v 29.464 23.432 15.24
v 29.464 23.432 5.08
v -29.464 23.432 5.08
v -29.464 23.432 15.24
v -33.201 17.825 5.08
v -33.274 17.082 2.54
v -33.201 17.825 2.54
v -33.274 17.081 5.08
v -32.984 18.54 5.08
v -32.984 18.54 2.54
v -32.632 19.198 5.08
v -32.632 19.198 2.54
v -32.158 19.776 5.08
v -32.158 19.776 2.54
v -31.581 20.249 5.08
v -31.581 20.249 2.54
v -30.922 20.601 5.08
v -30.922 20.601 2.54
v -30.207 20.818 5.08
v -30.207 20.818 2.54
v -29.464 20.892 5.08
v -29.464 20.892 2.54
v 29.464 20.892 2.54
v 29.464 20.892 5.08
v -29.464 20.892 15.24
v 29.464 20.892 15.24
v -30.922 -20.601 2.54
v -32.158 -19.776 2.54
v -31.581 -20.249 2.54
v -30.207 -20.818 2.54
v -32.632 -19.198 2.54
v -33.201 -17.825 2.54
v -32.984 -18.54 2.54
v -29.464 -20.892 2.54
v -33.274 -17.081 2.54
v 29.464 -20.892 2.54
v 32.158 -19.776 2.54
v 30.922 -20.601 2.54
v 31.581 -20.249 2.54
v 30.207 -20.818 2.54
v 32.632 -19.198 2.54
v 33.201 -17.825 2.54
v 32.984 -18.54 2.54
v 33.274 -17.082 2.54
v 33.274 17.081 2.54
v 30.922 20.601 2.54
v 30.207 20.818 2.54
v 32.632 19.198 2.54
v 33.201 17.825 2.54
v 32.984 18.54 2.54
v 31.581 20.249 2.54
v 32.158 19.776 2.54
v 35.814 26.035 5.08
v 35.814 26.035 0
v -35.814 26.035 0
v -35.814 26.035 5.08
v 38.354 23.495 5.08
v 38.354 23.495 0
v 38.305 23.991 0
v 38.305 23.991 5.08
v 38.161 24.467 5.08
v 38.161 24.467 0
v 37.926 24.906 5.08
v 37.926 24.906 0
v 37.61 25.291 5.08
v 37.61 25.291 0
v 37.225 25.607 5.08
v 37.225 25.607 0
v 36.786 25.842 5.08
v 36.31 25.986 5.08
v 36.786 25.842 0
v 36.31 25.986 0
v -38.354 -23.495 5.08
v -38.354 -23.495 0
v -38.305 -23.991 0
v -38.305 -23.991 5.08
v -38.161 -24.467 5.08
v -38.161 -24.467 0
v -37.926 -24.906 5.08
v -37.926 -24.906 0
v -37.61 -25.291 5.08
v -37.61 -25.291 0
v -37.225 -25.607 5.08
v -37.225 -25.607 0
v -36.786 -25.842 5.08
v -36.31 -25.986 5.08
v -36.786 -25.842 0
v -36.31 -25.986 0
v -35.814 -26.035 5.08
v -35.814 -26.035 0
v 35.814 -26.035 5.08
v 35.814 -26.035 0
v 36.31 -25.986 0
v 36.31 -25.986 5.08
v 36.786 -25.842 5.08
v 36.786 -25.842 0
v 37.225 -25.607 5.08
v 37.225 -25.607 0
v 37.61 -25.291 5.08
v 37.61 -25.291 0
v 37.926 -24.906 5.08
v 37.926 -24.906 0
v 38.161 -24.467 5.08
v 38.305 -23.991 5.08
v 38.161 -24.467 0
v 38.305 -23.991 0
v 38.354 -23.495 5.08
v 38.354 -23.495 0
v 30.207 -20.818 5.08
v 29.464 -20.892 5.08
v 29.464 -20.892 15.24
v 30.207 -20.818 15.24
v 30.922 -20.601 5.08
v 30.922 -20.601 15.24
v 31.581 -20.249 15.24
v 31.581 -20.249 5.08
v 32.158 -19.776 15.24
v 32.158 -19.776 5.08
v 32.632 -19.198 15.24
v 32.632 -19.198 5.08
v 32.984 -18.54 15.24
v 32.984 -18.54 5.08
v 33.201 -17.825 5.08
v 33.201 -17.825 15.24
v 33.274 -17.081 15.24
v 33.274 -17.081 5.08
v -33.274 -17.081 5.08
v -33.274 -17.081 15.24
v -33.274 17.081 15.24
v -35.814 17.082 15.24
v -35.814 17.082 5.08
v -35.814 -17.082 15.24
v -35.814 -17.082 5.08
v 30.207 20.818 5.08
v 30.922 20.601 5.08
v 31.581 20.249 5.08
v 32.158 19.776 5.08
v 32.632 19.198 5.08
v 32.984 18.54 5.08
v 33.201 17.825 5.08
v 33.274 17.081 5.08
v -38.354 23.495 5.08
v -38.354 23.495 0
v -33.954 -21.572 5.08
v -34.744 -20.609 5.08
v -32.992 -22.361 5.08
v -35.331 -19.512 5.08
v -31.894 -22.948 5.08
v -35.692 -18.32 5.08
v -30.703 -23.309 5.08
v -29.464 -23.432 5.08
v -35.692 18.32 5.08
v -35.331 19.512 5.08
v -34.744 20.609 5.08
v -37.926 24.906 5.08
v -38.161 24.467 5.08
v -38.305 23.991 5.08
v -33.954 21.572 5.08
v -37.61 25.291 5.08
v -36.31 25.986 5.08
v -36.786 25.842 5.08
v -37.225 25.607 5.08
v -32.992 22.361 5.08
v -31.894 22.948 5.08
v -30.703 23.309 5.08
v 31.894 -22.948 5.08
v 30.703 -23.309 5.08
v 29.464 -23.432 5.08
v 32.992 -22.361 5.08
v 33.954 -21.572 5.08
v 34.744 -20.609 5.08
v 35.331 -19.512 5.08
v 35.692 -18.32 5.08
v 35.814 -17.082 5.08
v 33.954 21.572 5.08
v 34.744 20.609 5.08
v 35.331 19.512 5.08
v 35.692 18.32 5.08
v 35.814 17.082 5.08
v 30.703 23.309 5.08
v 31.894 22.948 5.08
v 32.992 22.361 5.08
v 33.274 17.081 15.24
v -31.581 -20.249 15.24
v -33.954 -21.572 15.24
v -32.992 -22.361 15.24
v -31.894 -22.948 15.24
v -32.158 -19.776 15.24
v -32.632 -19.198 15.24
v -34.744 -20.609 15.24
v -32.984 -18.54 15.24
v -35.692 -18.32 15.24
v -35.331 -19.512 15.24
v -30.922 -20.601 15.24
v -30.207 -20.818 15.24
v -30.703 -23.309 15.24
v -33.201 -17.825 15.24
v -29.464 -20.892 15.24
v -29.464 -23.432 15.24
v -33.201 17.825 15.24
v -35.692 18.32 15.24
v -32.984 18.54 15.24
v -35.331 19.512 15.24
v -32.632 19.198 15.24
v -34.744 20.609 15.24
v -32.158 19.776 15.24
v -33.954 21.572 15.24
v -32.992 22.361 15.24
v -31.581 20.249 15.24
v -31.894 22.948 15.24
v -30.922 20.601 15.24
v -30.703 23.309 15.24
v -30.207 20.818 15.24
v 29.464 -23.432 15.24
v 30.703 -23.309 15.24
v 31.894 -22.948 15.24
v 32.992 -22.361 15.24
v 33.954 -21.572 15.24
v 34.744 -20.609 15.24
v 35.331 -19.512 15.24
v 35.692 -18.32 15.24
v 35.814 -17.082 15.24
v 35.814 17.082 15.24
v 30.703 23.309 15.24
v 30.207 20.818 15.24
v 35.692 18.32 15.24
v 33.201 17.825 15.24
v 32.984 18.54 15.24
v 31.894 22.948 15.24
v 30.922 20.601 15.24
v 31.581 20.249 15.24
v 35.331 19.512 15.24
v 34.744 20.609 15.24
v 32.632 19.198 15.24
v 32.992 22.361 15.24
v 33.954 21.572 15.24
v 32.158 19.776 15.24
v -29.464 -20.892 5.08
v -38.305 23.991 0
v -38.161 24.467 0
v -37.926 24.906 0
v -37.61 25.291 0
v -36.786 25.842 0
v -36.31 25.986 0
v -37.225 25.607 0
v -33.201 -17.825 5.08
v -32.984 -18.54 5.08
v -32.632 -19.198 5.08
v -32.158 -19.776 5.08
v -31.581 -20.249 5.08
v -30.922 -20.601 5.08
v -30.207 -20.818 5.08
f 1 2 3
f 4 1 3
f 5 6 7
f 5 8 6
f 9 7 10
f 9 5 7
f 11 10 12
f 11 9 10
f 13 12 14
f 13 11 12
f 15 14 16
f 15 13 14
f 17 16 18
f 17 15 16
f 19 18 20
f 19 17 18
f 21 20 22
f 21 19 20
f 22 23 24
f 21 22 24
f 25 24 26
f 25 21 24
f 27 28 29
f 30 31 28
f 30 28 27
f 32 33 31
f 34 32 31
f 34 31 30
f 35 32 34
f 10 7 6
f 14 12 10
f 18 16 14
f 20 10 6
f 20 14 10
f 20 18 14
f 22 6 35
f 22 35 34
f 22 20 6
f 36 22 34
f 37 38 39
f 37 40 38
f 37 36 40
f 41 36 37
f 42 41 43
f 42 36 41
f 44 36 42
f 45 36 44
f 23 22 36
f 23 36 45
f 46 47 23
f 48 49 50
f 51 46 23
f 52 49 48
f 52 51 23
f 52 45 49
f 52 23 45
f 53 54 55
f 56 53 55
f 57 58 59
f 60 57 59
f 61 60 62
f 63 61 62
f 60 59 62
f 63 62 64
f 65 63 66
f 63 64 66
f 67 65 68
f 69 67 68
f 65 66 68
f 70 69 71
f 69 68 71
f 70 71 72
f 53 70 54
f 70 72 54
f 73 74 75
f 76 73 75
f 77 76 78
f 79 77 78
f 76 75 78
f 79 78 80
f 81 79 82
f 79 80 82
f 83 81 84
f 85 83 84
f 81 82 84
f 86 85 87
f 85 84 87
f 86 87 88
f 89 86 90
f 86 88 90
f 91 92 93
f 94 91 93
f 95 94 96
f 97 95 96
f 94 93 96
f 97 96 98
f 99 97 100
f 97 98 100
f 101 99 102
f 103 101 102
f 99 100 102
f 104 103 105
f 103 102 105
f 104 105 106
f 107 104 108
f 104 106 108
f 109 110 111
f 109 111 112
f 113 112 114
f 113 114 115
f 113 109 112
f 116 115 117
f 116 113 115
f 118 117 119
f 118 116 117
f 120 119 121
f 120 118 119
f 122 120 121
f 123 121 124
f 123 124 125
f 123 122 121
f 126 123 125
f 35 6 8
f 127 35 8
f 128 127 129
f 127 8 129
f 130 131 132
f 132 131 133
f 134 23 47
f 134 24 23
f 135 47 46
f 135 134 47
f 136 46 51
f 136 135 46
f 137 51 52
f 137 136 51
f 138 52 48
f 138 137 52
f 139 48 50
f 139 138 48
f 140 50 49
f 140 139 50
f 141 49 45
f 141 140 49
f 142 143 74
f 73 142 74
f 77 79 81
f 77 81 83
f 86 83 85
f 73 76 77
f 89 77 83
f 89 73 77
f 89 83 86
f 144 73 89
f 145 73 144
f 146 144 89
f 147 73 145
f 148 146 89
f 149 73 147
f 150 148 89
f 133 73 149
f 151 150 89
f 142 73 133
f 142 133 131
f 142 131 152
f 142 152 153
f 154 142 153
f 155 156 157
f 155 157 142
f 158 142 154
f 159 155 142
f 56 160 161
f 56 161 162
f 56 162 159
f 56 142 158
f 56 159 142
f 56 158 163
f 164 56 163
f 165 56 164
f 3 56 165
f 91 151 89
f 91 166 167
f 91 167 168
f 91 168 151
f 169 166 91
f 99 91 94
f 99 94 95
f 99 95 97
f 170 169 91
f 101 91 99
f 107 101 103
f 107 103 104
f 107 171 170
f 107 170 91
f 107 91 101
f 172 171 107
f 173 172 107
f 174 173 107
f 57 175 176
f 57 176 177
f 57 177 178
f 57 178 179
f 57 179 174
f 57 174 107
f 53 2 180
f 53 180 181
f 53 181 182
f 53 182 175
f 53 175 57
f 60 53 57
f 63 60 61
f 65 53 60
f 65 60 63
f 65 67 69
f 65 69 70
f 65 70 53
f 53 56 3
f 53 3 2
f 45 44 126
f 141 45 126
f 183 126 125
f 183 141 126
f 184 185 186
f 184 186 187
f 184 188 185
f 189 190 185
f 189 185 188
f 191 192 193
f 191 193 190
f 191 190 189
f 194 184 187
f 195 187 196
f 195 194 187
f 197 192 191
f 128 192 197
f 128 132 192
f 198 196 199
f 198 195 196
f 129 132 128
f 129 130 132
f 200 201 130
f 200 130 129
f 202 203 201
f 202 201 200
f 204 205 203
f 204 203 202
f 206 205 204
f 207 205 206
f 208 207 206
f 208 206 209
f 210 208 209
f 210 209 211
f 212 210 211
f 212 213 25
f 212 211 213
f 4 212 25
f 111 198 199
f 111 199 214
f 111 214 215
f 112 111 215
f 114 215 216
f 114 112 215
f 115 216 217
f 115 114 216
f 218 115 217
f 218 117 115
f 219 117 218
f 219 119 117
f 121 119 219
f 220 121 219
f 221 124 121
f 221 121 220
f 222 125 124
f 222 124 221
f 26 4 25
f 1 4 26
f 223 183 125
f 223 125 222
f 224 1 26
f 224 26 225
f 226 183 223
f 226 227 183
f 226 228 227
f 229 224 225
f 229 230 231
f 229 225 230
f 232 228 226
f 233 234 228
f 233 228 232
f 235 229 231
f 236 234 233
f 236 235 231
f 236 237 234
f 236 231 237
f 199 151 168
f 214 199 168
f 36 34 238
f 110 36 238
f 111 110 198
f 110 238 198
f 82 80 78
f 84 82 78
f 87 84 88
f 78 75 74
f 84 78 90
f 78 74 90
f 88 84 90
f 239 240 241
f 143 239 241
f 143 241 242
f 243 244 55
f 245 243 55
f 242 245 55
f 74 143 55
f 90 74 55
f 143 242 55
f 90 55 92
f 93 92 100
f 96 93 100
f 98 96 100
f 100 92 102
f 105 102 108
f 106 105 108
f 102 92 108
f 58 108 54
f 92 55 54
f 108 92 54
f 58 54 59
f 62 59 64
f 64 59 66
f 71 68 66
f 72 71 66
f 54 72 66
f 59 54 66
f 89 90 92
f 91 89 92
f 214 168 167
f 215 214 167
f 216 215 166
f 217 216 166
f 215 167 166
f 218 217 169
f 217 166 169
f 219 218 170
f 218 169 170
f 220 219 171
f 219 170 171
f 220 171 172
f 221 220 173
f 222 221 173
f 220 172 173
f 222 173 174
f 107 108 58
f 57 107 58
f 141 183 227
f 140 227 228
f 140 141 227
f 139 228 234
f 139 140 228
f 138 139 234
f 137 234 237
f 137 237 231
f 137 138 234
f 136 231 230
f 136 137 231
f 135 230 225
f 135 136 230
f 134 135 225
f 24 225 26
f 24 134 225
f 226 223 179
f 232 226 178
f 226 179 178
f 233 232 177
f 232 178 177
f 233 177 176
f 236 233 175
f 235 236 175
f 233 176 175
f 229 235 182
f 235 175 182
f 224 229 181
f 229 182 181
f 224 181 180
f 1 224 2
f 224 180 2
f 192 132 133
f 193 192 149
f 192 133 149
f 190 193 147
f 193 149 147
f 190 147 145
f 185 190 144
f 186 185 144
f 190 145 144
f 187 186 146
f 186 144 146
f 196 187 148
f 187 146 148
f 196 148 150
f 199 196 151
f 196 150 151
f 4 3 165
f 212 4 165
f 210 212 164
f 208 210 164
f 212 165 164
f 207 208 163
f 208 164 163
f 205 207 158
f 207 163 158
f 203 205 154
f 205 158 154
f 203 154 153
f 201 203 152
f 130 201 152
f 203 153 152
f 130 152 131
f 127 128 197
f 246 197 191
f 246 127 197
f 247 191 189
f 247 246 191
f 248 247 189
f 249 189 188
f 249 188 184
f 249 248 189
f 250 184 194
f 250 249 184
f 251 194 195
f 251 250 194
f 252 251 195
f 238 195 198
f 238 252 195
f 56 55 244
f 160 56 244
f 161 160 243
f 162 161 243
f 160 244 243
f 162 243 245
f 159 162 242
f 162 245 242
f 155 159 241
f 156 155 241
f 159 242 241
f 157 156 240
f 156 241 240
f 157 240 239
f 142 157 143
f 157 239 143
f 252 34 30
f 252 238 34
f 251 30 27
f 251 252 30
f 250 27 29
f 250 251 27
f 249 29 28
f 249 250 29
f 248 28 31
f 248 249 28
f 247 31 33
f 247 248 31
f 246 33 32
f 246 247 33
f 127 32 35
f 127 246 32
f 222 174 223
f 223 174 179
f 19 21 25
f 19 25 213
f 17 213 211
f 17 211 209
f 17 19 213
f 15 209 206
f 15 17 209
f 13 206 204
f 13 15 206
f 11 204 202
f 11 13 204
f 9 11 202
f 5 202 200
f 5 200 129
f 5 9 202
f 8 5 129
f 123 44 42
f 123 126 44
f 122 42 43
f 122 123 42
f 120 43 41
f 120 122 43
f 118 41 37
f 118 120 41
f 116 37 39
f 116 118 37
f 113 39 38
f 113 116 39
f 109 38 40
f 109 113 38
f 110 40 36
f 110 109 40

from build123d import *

# Parameters (mm, degrees)
F1_DEPTH     = 5.08
F3_DEPTH     = 15.24
F4_T         = 2.54
F4_T3_DEPTH  = 64.008
F4_T5_DEPTH  = 39.243
F4_T8_ANGLE  = 90.000000001
F4_T10_ANGLE = 90.000000001
F4_T12_ANGLE = 90.000000001
F4_T14_ANGLE = 90.000000001


# Not quite as in the source:
# - a shell that OpenCascade refuses in one call is made with other operations: the cavity is built on its own and cut out
# - the program builds the solid bodies; features that only make, move or delete a surface that nothing else refers to are left out


with BuildPart() as f1:
    # F0 (on Top) → F1 (new body)
    with BuildSketch(Plane.XY):
        with BuildLine():
            Line((35.814, 26.035), (-35.814, 26.035))
            ThreePointArc((-35.814, 26.035), (-37.6100512242, 25.2910512242), (-38.354, 23.495))
            Line((-38.354, 23.495), (-38.354, -23.495))
            ThreePointArc((-38.354, -23.495), (-37.6100512242, -25.2910512242), (-35.814, -26.035))
            Line((-35.814, -26.035), (35.814, -26.035))
            ThreePointArc((35.814, -26.035), (37.6100512242, -25.2910512242), (38.354, -23.495))
            Line((38.354, -23.495), (38.354, 23.495))
            ThreePointArc((38.354, 23.495), (37.6100512242, 25.2910512242), (35.814, 26.035))
        make_face()
        with BuildLine():
            ThreePointArc((-35.814, 17.0815), (-33.9541280605, 21.5716280605), (-29.464, 23.4315))
            Line((-29.464, 23.4315), (29.464, 23.4315))
            ThreePointArc((29.464, 23.4315), (33.9541280605, 21.5716280605), (35.814, 17.0815))
            Line((35.814, 17.0815), (35.814, -17.0815))
            ThreePointArc((35.814, -17.0815), (33.9541280605, -21.5716280605), (29.464, -23.4315))
            Line((29.464, -23.4315), (-29.464, -23.4315))
            ThreePointArc((-29.464, -23.4315), (-33.9541280605, -21.5716280605), (-35.814, -17.0815))
            Line((-35.814, -17.0815), (-35.814, 17.0815))
        make_face(mode=Mode.SUBTRACT)
    extrude(amount=F1_DEPTH)

    # F0 (on Top) → F3 (join)
    with BuildSketch(Plane.XY):
        with BuildLine():
            Line((29.464, 23.4315), (-29.464, 23.4315))
            ThreePointArc((-29.464, 23.4315), (-33.9541280605, 21.5716280605), (-35.814, 17.0815))
            Line((-35.814, 17.0815), (-35.814, -17.0815))
            ThreePointArc((-35.814, -17.0815), (-33.9541280605, -21.5716280605), (-29.464, -23.4315))
            Line((-29.464, -23.4315), (29.464, -23.4315))
            ThreePointArc((29.464, -23.4315), (33.9541280605, -21.5716280605), (35.814, -17.0815))
            Line((35.814, -17.0815), (35.814, 17.0815))
            ThreePointArc((35.814, 17.0815), (33.9541280605, 21.5716280605), (29.464, 23.4315))
        make_face()
    extrude(amount=F3_DEPTH)

    # F4: shell of thickness 2.54, made by hand


with BuildPart() as f4_core1:
    # F4_t2: copy of F1
    add(f1.part)

    # the walls: a layer under each face that stays
    f4_faces = [f4_core1.faces().sort_by_distance(p)[0] for p in [
        (0, 26.035, 2.54),
        (0, 0, 0),
        (-35.7970666667, -24.2993333333, 5.08),
        (38.354, 0, 2.54),
        (-38.354, 0, 2.54),
        (0, -26.035, 2.54),
        (-33.9541280605, 21.5716280605, 10.16),
        (0, 23.4315, 10.16),
        (33.9541280605, 21.5716280605, 10.16),
        (35.814, 0, 10.16),
        (33.9541280605, -21.5716280605, 10.16),
        (0, -23.4315, 10.16),
        (-33.9541280605, -21.5716280605, 10.16),
        (-35.814, 0, 10.16),
    ]]
    thicken(f4_faces, amount=-F4_T, mode=Mode.SUBTRACT)

    # F4_s4 → F4_t3 (cut)
    with BuildSketch(Plane.YZ.offset(-32.004)):
        Polygon((23.4569, 5.1054), (23.4315, 2.54), (20.8915, 2.54), (20.8915, 5.08), align=None)
        Polygon((-23.4569, 5.1054), (-23.4315, 2.54), (-20.8915, 2.54), (-20.8915, 5.08), align=None)
    extrude(amount=F4_T3_DEPTH, mode=Mode.SUBTRACT)

    # F4_s6 → F4_t5 (cut)
    with BuildSketch(Plane.XZ.offset(-19.6215)):
        Polygon((35.8394, 5.1054), (35.814, 2.54), (33.274, 2.54), (33.274, 5.08), align=None)
        Polygon((-35.8394, 5.1054), (-35.814, 2.54), (-33.274, 2.54), (-33.274, 5.08), align=None)
    extrude(amount=F4_T5_DEPTH, mode=Mode.SUBTRACT)

    # F4_s7 → F4_t8 (revolve, cut)
    with BuildSketch(Plane.XZ.offset(-17.0815)):
        Polygon((-35.8394, 5.1054), (-35.814, 2.54), (-33.274, 2.54), (-33.274, 5.08), align=None)
    revolve(axis=Axis((-29.464, 17.0815, 5.08), (0, 0, -1)), revolution_arc=F4_T8_ANGLE, mode=Mode.SUBTRACT)

    # F4_s9 → F4_t10 (revolve, cut)
    with BuildSketch(Plane.YZ.offset(29.464)):
        Polygon((23.4569, 5.1054), (23.4315, 2.54), (20.8915, 2.54), (20.8915, 5.08), align=None)
    revolve(axis=Axis((29.464, 17.0815, 5.08), (0, 0, -1)), revolution_arc=F4_T10_ANGLE, mode=Mode.SUBTRACT)

    # F4_s11 → F4_t12 (revolve, cut)
    with BuildSketch(Plane.XZ.offset(17.0815)):
        Polygon((35.8394, 5.1054), (35.814, 2.54), (33.274, 2.54), (33.274, 5.08), align=None)
    revolve(axis=Axis((29.464, -17.0815, 5.08), (0, 0, -1)), revolution_arc=F4_T12_ANGLE, mode=Mode.SUBTRACT)

    # F4_s13 → F4_t14 (revolve, cut)
    with BuildSketch(Plane.YZ.offset(-29.464)):
        Polygon((-23.4569, 5.1054), (-23.4315, 2.54), (-20.8915, 2.54), (-20.8915, 5.08), align=None)
    revolve(axis=Axis((-29.464, -17.0815, 5.08), (0, 0, -1)), revolution_arc=F4_T14_ANGLE, mode=Mode.SUBTRACT)


with BuildPart() as f1_1:
    add(f1.part)

    # what is left inside the walls is the cavity
    f4_cavity = [f4_core1.part.solids().sort_by_distance(p)[0] for p in [
        (0, -6.963833, 2.5654),
    ]]
    add(f4_cavity, mode=Mode.SUBTRACT)


solid = f1_1.part
